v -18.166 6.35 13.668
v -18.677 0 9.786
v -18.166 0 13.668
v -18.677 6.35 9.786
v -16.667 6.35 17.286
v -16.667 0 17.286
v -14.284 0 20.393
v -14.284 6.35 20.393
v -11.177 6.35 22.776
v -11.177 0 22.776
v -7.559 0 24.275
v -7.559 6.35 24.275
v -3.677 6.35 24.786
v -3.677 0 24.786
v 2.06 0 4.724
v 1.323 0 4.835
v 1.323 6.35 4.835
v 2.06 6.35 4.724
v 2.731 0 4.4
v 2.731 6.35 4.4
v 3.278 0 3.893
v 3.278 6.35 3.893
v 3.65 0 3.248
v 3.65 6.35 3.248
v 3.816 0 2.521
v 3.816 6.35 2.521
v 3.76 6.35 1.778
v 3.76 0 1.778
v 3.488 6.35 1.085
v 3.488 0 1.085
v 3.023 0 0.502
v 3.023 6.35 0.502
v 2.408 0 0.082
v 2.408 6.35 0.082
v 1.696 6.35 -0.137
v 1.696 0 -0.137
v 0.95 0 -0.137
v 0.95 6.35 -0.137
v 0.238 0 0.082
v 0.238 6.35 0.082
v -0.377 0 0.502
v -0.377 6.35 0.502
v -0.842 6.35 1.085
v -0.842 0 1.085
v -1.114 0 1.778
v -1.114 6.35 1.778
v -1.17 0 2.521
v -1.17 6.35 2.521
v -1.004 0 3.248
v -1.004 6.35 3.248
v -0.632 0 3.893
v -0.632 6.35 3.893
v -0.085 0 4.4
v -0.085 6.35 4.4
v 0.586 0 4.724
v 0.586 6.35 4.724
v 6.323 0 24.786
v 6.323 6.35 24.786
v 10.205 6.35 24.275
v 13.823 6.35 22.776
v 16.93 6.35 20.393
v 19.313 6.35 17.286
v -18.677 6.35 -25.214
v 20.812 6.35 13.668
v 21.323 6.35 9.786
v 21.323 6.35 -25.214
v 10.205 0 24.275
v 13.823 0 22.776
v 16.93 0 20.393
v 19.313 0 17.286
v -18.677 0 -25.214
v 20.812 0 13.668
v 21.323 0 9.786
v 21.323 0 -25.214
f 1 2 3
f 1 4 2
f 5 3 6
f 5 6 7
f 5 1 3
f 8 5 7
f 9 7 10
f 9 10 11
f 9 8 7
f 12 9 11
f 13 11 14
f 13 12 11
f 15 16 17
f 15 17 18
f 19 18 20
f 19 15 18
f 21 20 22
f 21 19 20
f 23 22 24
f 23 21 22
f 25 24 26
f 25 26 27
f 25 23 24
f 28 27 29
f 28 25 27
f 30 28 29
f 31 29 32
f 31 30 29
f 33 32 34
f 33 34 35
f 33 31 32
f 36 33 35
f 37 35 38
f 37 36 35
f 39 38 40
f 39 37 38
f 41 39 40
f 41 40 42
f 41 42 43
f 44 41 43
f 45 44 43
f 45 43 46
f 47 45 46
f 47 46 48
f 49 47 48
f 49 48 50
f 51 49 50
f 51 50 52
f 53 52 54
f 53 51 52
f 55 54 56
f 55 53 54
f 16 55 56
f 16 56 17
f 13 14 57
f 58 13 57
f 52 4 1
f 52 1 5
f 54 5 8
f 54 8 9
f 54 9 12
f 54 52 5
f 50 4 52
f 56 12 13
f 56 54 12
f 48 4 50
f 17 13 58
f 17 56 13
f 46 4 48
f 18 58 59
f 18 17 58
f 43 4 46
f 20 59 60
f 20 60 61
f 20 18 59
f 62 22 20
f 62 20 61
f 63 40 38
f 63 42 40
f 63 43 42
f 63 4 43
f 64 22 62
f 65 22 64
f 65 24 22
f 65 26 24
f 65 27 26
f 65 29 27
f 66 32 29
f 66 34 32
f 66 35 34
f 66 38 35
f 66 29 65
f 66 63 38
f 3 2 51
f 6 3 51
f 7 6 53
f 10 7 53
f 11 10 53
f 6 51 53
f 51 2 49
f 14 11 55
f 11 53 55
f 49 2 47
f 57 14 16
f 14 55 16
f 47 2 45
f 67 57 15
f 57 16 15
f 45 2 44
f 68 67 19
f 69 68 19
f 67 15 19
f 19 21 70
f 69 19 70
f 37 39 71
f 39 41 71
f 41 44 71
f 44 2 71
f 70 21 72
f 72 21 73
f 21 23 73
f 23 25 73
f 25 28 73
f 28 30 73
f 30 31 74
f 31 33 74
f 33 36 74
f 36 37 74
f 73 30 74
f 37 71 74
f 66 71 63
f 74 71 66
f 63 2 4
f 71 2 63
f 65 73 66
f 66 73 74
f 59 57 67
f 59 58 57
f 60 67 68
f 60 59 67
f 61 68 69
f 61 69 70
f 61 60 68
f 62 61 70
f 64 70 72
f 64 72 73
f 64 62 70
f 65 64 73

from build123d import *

# Parameters (mm, degrees)
SKETCH1_W           = 40
SKETCH1_H           = 50
SKETCH1_R           = 2.5
BOSS_EXTRUDE1_DEPTH = 6.35
FILLET1_R           = 15


with BuildPart() as part:
    # Sketch1 → Boss-Extrude1 (new body)
    with BuildSketch(Plane(origin=(0, 0, 0), x_dir=(1, 0, 0), z_dir=(0, 1, 0))):
        with Locations((1.322957198, 0.214007782)):
            Rectangle(SKETCH1_W, SKETCH1_H)
        with Locations(Location((1.322957198, -2.33463035, 0), (0, 0, 270))):
            Circle(SKETCH1_R, mode=Mode.SUBTRACT)
    extrude(amount=BOSS_EXTRUDE1_DEPTH)

    # Fillet1
    fillet1_edges = [part.edges().sort_by_distance(p)[0] for p in [
        (21.322957198, 3.175, 24.785992218),
        (-18.677042802, 3.175, 24.785992218),
    ]]
    fillet(fillet1_edges, radius=FILLET1_R)


solid = part.part
